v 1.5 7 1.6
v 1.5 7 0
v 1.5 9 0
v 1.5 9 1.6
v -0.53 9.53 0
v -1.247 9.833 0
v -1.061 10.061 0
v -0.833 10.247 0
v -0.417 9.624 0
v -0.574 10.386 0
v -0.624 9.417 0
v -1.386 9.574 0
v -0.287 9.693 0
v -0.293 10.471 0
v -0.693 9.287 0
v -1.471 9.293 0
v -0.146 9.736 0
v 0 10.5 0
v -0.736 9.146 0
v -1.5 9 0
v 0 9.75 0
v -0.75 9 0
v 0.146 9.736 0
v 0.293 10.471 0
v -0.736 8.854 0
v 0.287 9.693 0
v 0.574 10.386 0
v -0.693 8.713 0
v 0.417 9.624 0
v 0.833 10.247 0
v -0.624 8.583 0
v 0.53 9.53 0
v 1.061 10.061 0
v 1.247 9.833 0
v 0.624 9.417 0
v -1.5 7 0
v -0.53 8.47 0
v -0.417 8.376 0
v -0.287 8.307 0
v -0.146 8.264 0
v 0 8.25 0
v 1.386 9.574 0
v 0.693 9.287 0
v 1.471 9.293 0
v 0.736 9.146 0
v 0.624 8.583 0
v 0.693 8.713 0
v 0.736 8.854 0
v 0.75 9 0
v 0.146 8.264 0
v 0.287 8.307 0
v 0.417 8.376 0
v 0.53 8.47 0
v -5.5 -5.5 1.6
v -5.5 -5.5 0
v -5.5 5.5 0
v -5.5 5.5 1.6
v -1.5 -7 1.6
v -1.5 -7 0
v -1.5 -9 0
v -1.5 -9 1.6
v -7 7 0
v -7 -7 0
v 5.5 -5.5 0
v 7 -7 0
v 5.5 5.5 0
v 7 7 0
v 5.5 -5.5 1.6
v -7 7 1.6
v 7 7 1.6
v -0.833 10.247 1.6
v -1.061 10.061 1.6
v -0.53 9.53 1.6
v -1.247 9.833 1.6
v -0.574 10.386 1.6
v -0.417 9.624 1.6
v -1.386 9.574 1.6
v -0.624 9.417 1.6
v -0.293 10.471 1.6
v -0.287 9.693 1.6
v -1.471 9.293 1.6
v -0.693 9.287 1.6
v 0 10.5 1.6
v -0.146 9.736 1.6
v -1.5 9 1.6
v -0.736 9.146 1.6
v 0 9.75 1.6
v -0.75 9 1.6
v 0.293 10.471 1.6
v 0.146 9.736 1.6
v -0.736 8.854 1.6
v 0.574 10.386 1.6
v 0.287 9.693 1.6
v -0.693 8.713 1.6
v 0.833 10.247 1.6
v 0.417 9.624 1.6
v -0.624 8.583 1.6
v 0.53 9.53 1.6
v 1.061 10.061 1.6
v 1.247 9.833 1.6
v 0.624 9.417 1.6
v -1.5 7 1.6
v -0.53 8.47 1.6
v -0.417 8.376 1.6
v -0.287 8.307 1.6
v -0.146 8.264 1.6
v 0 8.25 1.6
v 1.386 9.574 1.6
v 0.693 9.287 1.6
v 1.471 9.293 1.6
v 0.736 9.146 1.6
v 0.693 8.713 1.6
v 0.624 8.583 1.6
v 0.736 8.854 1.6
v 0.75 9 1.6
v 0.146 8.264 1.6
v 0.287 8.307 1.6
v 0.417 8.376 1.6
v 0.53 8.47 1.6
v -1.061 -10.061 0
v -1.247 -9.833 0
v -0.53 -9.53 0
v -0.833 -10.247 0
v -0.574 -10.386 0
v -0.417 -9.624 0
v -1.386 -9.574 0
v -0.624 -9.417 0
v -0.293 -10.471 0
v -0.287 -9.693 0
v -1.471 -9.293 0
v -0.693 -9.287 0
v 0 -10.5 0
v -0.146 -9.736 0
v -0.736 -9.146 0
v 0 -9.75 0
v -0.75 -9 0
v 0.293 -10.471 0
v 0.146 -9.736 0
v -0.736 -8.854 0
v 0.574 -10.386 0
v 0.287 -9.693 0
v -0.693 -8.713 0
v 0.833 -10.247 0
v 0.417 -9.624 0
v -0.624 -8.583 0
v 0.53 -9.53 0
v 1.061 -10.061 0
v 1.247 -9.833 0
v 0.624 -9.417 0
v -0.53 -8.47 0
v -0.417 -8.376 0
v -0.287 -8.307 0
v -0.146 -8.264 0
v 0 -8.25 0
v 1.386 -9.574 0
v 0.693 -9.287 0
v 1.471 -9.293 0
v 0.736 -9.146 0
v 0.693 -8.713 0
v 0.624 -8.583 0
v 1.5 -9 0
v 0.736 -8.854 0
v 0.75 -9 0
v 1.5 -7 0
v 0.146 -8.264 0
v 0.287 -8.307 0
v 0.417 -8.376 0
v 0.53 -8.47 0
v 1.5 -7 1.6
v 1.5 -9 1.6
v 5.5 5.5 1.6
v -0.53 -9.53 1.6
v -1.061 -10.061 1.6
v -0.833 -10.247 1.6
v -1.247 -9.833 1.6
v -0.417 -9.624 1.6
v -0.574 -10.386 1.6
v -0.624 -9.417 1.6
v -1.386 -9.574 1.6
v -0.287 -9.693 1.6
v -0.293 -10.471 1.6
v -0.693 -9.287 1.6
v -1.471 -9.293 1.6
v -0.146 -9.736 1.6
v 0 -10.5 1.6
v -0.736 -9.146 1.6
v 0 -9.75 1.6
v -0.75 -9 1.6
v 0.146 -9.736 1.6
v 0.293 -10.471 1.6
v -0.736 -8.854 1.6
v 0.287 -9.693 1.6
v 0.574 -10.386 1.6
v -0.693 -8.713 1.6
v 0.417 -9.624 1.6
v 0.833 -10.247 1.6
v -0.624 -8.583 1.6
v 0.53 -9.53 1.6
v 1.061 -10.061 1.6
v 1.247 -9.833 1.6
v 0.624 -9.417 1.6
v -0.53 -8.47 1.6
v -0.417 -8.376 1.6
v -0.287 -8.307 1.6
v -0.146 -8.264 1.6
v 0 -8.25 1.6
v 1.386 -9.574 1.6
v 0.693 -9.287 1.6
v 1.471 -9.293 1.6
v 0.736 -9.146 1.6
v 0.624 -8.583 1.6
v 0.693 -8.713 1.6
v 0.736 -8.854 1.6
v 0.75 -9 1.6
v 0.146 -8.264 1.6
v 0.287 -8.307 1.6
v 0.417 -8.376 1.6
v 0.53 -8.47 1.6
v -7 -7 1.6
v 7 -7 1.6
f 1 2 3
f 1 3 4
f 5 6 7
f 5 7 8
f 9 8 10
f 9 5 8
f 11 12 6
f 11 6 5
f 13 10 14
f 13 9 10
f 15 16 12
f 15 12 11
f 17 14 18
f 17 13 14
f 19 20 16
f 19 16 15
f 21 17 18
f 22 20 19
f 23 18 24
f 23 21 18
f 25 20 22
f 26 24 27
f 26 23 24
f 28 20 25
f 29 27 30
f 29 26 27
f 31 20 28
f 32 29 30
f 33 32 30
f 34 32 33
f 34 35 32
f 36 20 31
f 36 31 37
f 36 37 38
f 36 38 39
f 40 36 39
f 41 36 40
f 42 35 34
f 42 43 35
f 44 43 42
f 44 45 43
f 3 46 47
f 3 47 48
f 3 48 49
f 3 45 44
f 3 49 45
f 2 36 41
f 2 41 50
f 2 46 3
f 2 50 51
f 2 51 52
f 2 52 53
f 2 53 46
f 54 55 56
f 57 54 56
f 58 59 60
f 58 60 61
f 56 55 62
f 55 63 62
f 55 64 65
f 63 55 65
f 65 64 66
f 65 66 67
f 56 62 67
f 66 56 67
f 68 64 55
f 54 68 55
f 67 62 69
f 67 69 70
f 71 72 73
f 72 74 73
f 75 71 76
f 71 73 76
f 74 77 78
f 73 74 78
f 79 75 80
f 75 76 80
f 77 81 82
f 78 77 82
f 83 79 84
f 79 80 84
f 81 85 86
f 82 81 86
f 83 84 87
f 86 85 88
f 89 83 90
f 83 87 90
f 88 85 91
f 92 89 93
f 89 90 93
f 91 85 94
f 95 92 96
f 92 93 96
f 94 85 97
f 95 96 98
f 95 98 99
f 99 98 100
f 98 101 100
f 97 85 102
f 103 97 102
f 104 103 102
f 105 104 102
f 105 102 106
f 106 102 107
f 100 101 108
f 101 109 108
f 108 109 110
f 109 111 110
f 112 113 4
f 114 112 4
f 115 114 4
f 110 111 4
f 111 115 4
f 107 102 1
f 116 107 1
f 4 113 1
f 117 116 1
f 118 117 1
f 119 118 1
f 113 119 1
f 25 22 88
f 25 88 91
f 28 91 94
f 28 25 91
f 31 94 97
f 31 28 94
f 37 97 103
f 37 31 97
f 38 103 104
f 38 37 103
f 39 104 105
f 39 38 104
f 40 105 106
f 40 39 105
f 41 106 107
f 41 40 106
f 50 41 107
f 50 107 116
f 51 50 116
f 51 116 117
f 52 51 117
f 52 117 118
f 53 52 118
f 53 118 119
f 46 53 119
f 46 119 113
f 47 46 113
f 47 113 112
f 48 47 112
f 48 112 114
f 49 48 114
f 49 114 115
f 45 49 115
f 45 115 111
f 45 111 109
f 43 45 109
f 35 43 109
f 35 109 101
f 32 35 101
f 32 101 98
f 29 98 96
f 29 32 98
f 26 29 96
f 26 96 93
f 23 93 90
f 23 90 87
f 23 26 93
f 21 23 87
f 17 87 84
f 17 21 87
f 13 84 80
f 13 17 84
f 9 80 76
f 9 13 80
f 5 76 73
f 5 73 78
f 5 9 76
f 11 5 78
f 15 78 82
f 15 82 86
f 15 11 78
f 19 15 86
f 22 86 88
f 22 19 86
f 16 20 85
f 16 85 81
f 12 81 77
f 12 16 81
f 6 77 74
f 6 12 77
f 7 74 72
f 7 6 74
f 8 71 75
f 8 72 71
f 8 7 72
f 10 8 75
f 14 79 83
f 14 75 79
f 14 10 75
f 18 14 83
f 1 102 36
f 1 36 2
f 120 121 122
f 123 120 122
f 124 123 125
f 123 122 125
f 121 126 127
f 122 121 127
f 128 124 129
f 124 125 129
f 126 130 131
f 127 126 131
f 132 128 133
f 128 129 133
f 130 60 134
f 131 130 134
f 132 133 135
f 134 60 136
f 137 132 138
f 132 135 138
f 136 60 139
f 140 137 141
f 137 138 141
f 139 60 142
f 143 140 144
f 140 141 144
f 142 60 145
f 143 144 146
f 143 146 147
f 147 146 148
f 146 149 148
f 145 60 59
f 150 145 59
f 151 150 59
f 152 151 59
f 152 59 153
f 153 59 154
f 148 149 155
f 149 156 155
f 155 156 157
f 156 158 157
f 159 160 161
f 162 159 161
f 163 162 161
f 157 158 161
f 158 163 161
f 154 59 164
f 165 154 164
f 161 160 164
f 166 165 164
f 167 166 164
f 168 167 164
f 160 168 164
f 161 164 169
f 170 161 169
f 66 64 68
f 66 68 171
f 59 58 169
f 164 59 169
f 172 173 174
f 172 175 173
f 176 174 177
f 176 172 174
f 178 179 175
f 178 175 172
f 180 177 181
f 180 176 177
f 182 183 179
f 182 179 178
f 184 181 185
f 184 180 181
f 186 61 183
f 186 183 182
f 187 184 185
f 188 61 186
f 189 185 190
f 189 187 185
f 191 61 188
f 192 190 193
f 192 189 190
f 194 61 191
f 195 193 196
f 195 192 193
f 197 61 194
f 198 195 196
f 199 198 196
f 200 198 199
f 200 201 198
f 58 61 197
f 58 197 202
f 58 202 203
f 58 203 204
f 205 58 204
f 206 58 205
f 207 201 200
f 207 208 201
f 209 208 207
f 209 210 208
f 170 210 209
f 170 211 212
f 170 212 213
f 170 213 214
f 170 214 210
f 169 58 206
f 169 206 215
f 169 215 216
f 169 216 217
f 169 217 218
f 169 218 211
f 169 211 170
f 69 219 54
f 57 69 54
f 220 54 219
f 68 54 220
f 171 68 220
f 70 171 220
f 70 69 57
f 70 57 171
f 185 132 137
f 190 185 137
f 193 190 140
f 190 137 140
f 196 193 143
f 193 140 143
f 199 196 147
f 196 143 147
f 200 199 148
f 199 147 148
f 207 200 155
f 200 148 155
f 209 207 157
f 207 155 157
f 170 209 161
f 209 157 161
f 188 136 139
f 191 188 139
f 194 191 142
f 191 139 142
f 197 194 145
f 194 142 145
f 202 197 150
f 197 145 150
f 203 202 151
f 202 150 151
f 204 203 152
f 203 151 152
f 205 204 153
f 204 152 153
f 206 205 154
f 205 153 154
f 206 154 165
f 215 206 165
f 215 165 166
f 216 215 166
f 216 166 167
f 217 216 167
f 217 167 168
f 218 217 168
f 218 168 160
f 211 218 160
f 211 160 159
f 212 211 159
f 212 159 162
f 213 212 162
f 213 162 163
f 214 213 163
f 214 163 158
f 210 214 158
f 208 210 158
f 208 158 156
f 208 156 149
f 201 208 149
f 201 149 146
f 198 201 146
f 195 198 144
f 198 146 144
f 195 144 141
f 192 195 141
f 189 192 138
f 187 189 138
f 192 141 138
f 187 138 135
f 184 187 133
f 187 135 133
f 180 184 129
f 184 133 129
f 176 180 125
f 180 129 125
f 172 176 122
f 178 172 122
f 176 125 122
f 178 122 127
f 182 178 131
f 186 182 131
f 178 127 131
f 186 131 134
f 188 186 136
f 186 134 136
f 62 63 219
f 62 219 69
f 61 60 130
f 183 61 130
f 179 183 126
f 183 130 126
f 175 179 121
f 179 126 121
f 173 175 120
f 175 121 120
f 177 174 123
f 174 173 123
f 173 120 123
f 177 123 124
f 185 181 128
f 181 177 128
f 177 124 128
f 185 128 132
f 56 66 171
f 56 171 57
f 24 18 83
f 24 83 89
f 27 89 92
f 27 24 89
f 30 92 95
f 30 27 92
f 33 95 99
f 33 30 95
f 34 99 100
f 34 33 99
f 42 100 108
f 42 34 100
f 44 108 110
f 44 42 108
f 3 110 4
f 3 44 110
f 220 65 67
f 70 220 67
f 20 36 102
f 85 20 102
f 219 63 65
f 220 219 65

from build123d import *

# Parameters (mm, degrees)
SKETCH_2_W          = 14
SKETCH_2_H          = 14
EXTRUDE_1_DEPTH     = 1.6
SKETCH_3_W          = 3
SKETCH_3_H          = 1.6
EXTRUDE_2_DEPTH     = 3.5
CUT_EXTRUDE_1_DEPTH = 4
SKETCH_5_R          = 0.75
CUT_EXTRUDE_2_DEPTH = 4
SKETCH_6_W          = 11
SKETCH_6_H          = 11
CUT_EXTRUDE_3_DEPTH = 10


with BuildPart() as part:
    # 草图2 → 凸台-拉伸1 (new body)
    with BuildSketch(Plane.XY):
        Rectangle(SKETCH_2_W, SKETCH_2_H)
    extrude(amount=EXTRUDE_1_DEPTH)

    # 草图6 → 切除-拉伸3 (cut)
    with BuildSketch(Plane(origin=(0, 0, 0), x_dir=(-1, 0, 0), z_dir=(0, 0, -1))):
        Rectangle(SKETCH_6_W, SKETCH_6_H)
    extrude(amount=-CUT_EXTRUDE_3_DEPTH, mode=Mode.SUBTRACT)


with BuildPart() as body_2:
    # 草图3 → 凸台-拉伸2 (new body)
    with BuildSketch(Plane.XZ.offset(7)):
        with Locations((0, 0.8)):
            Rectangle(SKETCH_3_W, SKETCH_3_H)
    extrude(amount=EXTRUDE_2_DEPTH)

    # 草图4 → 切除-拉伸1 (cut)
    with BuildSketch(Plane(origin=(0, 0, 0), x_dir=(-1, 0, 0), z_dir=(0, 0, -1))):
        with BuildLine():
            Line((1.5, -10.5), (1.5, -9))
            ThreePointArc((1.5, -9), (1.060660172, -10.060660172), (0, -10.5))
            Line((0, -10.5), (1.5, -10.5))
        make_face()
        with BuildLine():
            ThreePointArc((0, -10.5), (-1.060660172, -10.060660172), (-1.5, -9))
            Line((-1.5, -9), (-1.5, -10.5))
            Line((-1.5, -10.5), (0, -10.5))
        make_face()
    extrude(amount=-CUT_EXTRUDE_1_DEPTH, mode=Mode.SUBTRACT)

    # 草图5 → 切除-拉伸2 (cut)
    with BuildSketch(Plane(origin=(0, 0, 0), x_dir=(-1, 0, 0), z_dir=(0, 0, -1))):
        with Locations((0, -9)):
            Circle(SKETCH_5_R)
    extrude(amount=-CUT_EXTRUDE_2_DEPTH, mode=Mode.SUBTRACT)


with BuildPart() as body_3:
    # 镜向7: mirrored copy
    add(body_2.part.mirror(Plane.ZX))


solid = Compound([part.part, body_2.part, body_3.part])
